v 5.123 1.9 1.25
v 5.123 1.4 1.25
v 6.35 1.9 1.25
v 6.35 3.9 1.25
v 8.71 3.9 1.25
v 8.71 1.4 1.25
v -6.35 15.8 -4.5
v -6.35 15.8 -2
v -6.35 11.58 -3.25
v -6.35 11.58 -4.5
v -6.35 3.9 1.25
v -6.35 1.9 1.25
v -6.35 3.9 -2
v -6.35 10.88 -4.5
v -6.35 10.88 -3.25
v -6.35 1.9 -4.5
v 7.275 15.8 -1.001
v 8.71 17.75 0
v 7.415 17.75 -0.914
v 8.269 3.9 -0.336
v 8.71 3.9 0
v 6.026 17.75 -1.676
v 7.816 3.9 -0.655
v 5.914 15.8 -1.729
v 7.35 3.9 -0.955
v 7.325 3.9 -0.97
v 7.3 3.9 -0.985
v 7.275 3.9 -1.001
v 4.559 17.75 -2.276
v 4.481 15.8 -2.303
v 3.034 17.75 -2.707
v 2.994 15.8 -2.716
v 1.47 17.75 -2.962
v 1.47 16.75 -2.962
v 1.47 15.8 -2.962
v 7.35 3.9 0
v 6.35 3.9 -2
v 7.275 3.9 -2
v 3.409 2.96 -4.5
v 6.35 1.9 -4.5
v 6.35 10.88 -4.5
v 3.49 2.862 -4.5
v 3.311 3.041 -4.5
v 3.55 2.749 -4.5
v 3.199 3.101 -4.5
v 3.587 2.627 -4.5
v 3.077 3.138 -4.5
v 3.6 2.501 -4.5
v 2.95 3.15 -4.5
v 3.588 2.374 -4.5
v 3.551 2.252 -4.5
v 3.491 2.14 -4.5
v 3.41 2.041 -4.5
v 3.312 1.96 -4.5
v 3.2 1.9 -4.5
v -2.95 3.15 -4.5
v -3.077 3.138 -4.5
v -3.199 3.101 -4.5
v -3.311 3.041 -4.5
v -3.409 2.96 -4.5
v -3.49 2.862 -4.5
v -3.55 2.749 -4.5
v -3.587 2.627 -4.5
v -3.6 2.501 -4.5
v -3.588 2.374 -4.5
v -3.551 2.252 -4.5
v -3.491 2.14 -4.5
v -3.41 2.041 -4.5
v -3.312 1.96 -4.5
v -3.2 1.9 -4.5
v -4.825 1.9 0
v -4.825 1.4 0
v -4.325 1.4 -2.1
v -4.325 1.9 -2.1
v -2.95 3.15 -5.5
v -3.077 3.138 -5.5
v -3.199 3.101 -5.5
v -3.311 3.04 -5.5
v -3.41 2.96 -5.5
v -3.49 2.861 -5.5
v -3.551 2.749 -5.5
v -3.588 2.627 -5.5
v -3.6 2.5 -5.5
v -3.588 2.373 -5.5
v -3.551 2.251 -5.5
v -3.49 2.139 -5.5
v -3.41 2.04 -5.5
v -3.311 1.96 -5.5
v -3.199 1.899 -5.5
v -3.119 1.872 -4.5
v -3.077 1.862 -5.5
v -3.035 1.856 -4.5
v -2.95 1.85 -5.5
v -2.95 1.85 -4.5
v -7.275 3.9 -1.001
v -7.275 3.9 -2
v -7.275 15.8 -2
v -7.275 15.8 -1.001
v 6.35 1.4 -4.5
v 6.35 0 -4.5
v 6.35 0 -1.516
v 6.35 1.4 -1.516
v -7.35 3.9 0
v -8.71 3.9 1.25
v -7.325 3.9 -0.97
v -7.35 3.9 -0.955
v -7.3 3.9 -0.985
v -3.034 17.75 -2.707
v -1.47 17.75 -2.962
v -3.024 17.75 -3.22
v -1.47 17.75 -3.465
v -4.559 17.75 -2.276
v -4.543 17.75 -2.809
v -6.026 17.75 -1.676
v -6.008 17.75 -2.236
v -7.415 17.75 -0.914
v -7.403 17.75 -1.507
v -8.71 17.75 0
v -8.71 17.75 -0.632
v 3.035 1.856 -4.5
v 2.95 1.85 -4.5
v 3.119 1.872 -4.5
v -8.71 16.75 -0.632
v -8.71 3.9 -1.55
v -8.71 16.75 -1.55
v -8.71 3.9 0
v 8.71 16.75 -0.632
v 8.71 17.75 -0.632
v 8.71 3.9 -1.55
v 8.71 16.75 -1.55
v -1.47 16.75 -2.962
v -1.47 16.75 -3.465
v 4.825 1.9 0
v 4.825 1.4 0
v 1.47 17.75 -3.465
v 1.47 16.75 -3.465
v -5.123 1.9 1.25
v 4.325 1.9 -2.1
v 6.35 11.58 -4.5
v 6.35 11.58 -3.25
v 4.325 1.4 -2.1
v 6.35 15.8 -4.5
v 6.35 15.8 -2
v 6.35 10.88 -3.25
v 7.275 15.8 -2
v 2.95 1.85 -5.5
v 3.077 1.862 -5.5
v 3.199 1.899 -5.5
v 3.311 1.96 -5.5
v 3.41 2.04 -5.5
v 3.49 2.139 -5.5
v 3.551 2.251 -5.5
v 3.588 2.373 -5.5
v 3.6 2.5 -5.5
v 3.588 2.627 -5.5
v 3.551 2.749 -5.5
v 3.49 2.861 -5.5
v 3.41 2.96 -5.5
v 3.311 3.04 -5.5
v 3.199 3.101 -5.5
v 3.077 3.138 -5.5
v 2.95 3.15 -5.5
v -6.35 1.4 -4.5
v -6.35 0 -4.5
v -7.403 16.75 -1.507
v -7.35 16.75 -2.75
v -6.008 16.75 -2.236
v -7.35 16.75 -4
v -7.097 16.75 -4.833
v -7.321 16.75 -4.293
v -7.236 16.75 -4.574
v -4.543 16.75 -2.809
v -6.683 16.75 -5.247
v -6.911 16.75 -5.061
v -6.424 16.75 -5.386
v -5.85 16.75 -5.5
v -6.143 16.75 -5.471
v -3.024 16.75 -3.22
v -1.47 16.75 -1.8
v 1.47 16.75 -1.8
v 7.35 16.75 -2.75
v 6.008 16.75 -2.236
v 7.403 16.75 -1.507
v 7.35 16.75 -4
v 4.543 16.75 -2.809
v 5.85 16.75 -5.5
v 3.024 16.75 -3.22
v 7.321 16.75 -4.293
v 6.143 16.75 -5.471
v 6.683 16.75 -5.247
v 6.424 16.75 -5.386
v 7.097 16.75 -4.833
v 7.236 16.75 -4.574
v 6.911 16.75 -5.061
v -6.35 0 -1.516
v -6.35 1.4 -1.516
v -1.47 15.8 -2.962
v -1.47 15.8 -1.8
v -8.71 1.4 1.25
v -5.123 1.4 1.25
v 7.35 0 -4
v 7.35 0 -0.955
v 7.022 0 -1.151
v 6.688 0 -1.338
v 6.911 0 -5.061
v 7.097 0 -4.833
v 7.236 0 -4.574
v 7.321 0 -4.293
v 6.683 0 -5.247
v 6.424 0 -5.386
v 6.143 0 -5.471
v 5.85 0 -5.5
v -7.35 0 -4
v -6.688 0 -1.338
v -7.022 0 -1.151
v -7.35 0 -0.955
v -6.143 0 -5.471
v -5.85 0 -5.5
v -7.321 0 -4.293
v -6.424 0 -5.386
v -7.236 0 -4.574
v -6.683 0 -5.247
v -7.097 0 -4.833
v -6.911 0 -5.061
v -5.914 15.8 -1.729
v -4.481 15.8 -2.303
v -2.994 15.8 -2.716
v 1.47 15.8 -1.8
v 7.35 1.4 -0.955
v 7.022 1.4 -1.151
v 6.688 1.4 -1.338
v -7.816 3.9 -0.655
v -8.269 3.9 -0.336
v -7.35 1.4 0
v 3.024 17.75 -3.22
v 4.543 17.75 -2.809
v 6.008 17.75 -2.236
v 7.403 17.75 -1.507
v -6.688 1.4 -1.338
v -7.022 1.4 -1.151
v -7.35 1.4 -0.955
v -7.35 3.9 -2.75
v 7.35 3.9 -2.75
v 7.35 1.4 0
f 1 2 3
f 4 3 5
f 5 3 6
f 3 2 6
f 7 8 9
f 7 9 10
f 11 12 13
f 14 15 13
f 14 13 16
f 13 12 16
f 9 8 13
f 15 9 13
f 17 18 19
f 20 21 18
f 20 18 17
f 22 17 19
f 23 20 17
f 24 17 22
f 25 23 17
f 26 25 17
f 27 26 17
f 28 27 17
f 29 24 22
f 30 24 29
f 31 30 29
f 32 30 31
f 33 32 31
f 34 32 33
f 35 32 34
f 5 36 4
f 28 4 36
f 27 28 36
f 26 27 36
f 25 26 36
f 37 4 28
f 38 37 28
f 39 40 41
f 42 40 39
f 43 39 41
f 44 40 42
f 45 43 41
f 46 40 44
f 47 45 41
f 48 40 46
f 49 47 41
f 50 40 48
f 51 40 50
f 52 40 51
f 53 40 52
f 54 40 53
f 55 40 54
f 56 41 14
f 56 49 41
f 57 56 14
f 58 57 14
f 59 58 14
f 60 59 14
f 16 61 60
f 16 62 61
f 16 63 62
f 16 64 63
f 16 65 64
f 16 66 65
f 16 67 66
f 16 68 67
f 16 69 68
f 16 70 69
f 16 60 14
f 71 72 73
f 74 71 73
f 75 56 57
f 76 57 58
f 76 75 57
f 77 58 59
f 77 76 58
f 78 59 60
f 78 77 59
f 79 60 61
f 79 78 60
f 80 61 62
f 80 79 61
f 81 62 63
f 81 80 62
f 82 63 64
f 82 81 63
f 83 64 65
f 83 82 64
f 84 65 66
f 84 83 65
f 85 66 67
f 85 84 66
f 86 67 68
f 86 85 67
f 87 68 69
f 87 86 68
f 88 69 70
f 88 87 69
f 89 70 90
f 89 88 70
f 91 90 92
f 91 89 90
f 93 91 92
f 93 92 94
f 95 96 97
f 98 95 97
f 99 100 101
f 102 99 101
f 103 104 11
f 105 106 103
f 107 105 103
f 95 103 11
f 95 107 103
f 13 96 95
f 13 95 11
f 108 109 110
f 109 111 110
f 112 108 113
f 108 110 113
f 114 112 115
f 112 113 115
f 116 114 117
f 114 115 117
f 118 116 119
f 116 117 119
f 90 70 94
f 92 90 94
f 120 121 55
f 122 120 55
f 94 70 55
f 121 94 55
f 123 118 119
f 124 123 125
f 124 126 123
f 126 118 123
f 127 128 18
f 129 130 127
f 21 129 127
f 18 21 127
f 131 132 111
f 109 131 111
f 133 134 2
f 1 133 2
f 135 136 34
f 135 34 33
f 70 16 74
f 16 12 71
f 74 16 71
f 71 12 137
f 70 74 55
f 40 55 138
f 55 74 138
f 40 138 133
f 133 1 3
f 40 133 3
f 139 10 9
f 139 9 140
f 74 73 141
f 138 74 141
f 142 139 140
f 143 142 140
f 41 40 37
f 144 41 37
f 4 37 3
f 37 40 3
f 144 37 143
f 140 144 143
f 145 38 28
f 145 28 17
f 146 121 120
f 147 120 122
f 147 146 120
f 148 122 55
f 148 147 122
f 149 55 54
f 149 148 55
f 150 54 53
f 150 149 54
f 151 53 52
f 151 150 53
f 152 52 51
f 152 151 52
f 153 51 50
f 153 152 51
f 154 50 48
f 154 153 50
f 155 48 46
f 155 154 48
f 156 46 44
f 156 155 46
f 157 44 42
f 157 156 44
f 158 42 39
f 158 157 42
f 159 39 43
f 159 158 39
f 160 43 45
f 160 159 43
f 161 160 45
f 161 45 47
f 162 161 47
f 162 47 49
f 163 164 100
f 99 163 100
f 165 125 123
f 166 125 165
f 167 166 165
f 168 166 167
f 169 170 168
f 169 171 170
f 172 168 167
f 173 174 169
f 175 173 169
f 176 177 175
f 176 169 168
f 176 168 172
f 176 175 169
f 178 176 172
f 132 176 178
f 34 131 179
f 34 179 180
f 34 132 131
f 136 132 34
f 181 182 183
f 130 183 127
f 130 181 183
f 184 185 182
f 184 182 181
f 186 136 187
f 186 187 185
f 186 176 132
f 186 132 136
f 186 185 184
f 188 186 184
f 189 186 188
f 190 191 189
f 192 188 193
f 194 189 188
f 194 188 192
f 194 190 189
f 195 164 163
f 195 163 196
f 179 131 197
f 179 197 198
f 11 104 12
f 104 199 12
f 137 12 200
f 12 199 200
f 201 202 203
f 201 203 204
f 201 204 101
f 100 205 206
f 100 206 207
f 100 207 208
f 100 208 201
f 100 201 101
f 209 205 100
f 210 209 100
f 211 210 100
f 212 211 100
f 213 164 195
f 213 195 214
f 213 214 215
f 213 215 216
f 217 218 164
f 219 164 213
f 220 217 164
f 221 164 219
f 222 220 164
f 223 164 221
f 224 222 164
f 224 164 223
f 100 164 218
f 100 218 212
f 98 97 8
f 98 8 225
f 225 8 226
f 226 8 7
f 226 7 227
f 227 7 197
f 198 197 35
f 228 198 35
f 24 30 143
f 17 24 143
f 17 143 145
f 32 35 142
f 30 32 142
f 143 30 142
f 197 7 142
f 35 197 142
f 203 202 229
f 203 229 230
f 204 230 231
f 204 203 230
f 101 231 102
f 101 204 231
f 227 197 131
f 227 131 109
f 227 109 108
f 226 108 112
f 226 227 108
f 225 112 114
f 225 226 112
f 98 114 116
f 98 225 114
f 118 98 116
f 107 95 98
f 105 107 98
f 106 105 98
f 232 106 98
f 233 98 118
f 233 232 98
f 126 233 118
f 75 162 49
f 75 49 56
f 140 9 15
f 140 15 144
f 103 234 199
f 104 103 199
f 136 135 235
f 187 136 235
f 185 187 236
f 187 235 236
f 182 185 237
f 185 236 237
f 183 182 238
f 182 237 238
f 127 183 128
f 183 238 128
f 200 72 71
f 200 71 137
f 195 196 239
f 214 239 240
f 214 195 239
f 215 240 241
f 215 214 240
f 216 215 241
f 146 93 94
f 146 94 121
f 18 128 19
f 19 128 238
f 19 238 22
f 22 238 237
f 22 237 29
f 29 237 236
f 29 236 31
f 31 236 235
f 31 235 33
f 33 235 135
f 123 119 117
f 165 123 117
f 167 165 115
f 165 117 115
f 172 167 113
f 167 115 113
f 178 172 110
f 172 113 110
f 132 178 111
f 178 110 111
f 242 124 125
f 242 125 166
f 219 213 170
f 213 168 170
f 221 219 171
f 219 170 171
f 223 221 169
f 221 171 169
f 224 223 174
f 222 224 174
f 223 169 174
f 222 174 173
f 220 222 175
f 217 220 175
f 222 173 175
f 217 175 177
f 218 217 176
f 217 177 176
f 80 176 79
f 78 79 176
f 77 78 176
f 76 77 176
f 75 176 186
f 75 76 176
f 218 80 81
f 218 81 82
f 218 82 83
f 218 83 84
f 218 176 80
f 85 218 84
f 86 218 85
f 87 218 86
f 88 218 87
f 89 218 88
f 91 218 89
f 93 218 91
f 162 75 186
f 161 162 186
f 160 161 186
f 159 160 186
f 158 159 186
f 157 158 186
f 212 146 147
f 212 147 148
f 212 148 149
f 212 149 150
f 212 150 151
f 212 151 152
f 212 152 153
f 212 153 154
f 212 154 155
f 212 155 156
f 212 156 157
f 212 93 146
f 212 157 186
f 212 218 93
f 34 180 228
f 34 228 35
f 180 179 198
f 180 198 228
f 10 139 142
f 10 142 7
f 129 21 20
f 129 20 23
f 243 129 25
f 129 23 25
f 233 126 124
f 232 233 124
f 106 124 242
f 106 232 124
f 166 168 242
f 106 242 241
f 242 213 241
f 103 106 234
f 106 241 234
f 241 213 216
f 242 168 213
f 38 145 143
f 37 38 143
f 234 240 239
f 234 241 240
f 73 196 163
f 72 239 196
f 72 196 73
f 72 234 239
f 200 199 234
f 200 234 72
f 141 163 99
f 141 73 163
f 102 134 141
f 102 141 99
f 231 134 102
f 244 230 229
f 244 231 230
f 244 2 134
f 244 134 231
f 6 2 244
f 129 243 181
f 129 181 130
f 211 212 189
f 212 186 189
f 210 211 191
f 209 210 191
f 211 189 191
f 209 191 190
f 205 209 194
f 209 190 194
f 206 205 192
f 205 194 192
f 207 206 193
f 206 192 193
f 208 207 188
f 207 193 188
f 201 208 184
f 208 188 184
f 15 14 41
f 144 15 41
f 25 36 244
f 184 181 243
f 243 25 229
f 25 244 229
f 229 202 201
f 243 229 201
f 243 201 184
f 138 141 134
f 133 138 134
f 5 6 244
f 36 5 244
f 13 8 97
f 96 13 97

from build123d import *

# Parameters (mm, degrees)
EXTRUDE_1_DEPTH     = 17.75
CUT_EXTRUDE_1_DEPTH = 1
SKETCH_3_W          = 2.94
SKETCH_3_H          = 1
CUT_EXTRUDE_2_DEPTH = 6.5
CUT_EXTRUDE_3_DEPTH = 3.9
SKETCH_5_W          = 12.7
SKETCH_5_H          = 2.983573368
CUT_EXTRUDE_4_DEPTH = 1.4
SKETCH_6_W          = 12.7
SKETCH_6_H          = 2.983573368
CUT_EXTRUDE_5_DEPTH = 13.9
SKETCH_7_W          = 14.55
SKETCH_7_H          = 11.9
CUT_EXTRUDE_6_DEPTH = 3
EXTRUDE_2_DEPTH     = 0.5
EXTRUDE_3_DEPTH     = 0.5
EXTRUDE_4_DEPTH     = 2
CUT_EXTRUDE_7_DEPTH = 1
SKETCH_12_W         = 12.7
SKETCH_12_H         = 0.7
EXTRUDE_5_DEPTH     = 1.25
FILLET_1_R          = 1.5
EXTRUDE_6_DEPTH     = 0.95


with BuildPart() as part:
    # Эскиз1 → Бобышка-Вытянуть1 (new body)
    with BuildSketch(Plane(origin=(0, 0, 0), x_dir=(1, 0, 0), z_dir=(0, 1, 0))):
        with BuildLine():
            Line((-7.35, 2.75), (-7.35, 5.5))
            Line((-7.35, 5.5), (7.35, 5.5))
            Line((7.35, 5.5), (7.35, 2.75))
            Line((7.35, 2.75), (8.71, 1.55))
            Line((8.71, 1.55), (8.71, 0))
            ThreePointArc((8.71, 0), (0, 3.039347647), (-8.71, 0))
            Line((-8.71, 0), (-8.71, 1.55))
            Line((-8.71, 1.55), (-7.35, 2.75))
        make_face()
    extrude(amount=EXTRUDE_1_DEPTH)

    # Эскиз2 → Вырез-Вытянуть1 (cut)
    with BuildSketch(Plane(origin=(0, 17.75, 0), x_dir=(1, 0, 0), z_dir=(0, 1, 0))):
        with BuildLine():
            Line((8.71, 0.631840908), (8.71, 1.55))
            Line((8.71, 1.55), (7.35, 2.75))
            Line((7.35, 2.75), (7.35, 5.5))
            Line((7.35, 5.5), (-7.35, 5.5))
            Line((-7.35, 5.5), (-7.35, 2.75))
            Line((-7.35, 2.75), (-8.71, 1.55))
            Line((-8.71, 1.55), (-8.71, 0.631840908))
            ThreePointArc((-8.71, 0.631840908), (0, 3.539347647), (8.71, 0.631840908))
        make_face()
    extrude(amount=-CUT_EXTRUDE_1_DEPTH, mode=Mode.SUBTRACT)

    # Эскиз3 → Вырез-Вытянуть2 (cut, through all)
    with BuildSketch(Plane(origin=(0, 0, -5.5), x_dir=(-1, 0, 0), z_dir=(0, 0, -1))):
        with Locations((0, 17.25)):
            Rectangle(SKETCH_3_W, SKETCH_3_H)
    extrude(amount=-CUT_EXTRUDE_2_DEPTH, mode=Mode.SUBTRACT)

    # Эскиз4 → Вырез-Вытянуть3 (cut)
    with BuildSketch(Plane.XZ):
        with BuildLine():
            Line((-7.35, -2.75), (-7.35, -0.954778819))
            ThreePointArc((-7.35, -0.954778819), (-8.044178059, -0.497584831), (-8.71, 0))
            Line((-8.71, 0), (-8.71, -1.55))
            Line((-8.71, -1.55), (-7.35, -2.75))
        make_face()
        with BuildLine():
            Line((7.35, -2.75), (7.35, -0.954778819))
            ThreePointArc((7.35, -0.954778819), (8.044178059, -0.497584831), (8.71, 0))
            Line((8.71, 0), (8.71, -1.55))
            Line((8.71, -1.55), (7.35, -2.75))
        make_face()
    extrude(amount=-CUT_EXTRUDE_3_DEPTH, mode=Mode.SUBTRACT)

    # Эскиз5 → Вырез-Вытянуть4 (cut)
    with BuildSketch(Plane.XZ):
        with Locations((0, -3.008213316)):
            Rectangle(SKETCH_5_W, SKETCH_5_H)
    extrude(amount=-CUT_EXTRUDE_4_DEPTH, mode=Mode.SUBTRACT)

    # Эскиз6 → Вырез-Вытянуть5 (cut)
    with BuildSketch(Plane(origin=(0, 1.9, 0), x_dir=(-1, 0, 0), z_dir=(0, -1, 0))):
        with Locations((0, 3.008213316)):
            Rectangle(SKETCH_6_W, SKETCH_6_H)
    extrude(amount=-CUT_EXTRUDE_5_DEPTH, mode=Mode.SUBTRACT)

    # Эскиз7 → Вырез-Вытянуть6 (cut, through all)
    with BuildSketch(Plane(origin=(0, 0, -2), x_dir=(-1, 0, 0), z_dir=(0, 0, -1))):
        with Locations((0, 9.85)):
            Rectangle(SKETCH_7_W, SKETCH_7_H)
    extrude(amount=-CUT_EXTRUDE_6_DEPTH, mode=Mode.SUBTRACT)

    # Эскиз8 → Бобышка-Вытянуть2 (add)
    with BuildSketch(Plane.XZ.offset(-1.4)):
        with BuildLine():
            Line((-7.35, 0), (-4.825, 0))
            Line((-4.825, 0), (-4.325, -2.1))
            Line((-4.325, -2.1), (4.325, -2.1))
            Line((4.325, -2.1), (4.825, 0))
            Line((4.825, 0), (7.35, 0))
            Line((7.35, 0), (7.35, -0.954778819))
            ThreePointArc((7.35, -0.954778819), (0, -3.039347647), (-7.35, -0.954778819))
            Line((-7.35, -0.954778819), (-7.35, 0))
        make_face()
    extrude(amount=-EXTRUDE_2_DEPTH)

    # Эскиз9 → Бобышка-Вытянуть3 (add)
    with BuildSketch(Plane.XZ.offset(-1.4)):
        Polygon((-4.825, 0), (-5.122619048, 1.25), (-8.71, 1.25), (-7.35, 0), align=None)
        Polygon((4.825, 0), (5.122619048, 1.25), (8.71, 1.25), (7.35, 0), align=None)
    extrude(amount=-EXTRUDE_3_DEPTH)

    # Эскиз10 → Бобышка-Вытянуть4 (add)
    with BuildSketch(Plane(origin=(0, 1.9, 0), x_dir=(1, 0, 0), z_dir=(0, 1, 0))):
        with BuildLine():
            Line((-7.35, 0), (-8.71, -1.25))
            Line((-8.71, -1.25), (-6.35, -1.25))
            Line((-6.35, -1.25), (-6.35, 1.516426632))
            ThreePointArc((-6.35, 1.516426632), (-6.855753939, 1.24584747), (-7.35, 0.954778819))
            Line((-7.35, 0.954778819), (-7.35, 0))
        make_face()
        with BuildLine():
            Line((7.35, 0), (7.35, 0.954778819))
            ThreePointArc((7.35, 0.954778819), (6.855753939, 1.24584747), (6.35, 1.516426632))
            Line((6.35, 1.516426632), (6.35, -1.25))
            Line((6.35, -1.25), (8.71, -1.25))
            Line((8.71, -1.25), (7.35, 0))
        make_face()
    extrude(amount=EXTRUDE_4_DEPTH)

    # Эскиз11 → Вырез-Вытянуть7 (cut)
    with BuildSketch(Plane(origin=(0, 0, -5.5), x_dir=(-1, 0, 0), z_dir=(0, 0, -1))):
        with BuildLine():
            Line((-2.95, 3.15), (2.95, 3.15))
            ThreePointArc((2.95, 3.15), (3.6, 2.5), (2.95, 1.85))
            Line((2.95, 1.85), (-2.95, 1.85))
            ThreePointArc((-2.95, 1.85), (-3.6, 2.5), (-2.95, 3.15))
        make_face()
    extrude(amount=-CUT_EXTRUDE_7_DEPTH, mode=Mode.SUBTRACT)

    # Эскиз12 → Бобышка-Вытянуть5 (add)
    with BuildSketch(Plane.XY.offset(-4.5)):
        with Locations((0, 11.23)):
            Rectangle(SKETCH_12_W, SKETCH_12_H)
    extrude(amount=EXTRUDE_5_DEPTH)

    # Скругление1
    fillet_1_edges = [part.edges().sort_by_distance(p)[0] for p in [
        (-7.35, 8.375, -5.5),
        (7.35, 8.375, -5.5),
    ]]
    fillet(fillet_1_edges, radius=FILLET_1_R)

    # Эскиз13 → Бобышка-Вытянуть6 (add)
    with BuildSketch(Plane(origin=(0, 16.75, 0), x_dir=(1, 0, 0), z_dir=(0, 1, 0))):
        with BuildLine():
            Line((-1.47, 2.961958753), (-1.47, 1.8))
            Line((-1.47, 1.8), (1.47, 1.8))
            Line((1.47, 1.8), (1.47, 2.961958753))
            ThreePointArc((1.47, 2.961958753), (0, 3.039347647), (-1.47, 2.961958753))
        make_face()
    extrude(amount=-EXTRUDE_6_DEPTH)


solid = part.part
